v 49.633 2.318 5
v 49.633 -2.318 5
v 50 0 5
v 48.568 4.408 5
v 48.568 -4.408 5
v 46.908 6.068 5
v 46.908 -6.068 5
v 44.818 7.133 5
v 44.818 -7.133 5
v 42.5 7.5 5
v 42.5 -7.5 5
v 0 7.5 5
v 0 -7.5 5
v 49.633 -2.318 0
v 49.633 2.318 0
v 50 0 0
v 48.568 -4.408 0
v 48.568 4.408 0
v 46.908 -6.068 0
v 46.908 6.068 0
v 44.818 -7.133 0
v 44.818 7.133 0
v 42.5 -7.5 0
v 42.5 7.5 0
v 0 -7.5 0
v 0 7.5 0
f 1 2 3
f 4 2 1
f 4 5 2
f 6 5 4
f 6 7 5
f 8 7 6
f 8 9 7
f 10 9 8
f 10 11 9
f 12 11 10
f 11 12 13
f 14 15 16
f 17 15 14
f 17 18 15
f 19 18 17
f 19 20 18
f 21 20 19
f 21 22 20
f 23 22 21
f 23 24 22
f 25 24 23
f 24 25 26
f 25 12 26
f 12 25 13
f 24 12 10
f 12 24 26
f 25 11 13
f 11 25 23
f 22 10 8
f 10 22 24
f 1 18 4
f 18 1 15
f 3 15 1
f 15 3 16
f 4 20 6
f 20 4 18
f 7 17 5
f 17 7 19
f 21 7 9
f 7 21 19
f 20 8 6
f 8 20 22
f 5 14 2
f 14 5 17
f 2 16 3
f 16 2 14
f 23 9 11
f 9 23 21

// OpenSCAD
// file: Library/center.scad
module center(axis){
	translate((axis / -2.0)){
		children();
	}
}
// file: CylinderDispenser_Dispenser_Hearth_Outer_Lip.scad
radius = 24.0;
height = 5.0;

/* [OpenSCAD] [Quality] */
$fn = 20;

module CylinderDispenser_Dispenser_Hearth_Outer_Lip(diameter, height){
		cylinder(d=diameter, h=height);
}

CylinderDispenser_Dispenser_Hearth_Outer_Lip(radius, height);
// file: CylinderDispenser_Dispenser_Hearth_Outer_Walkway.scad
use <Library/center.scad>

//Length, width, height.
dimensions = [50, 24, 5];

module CylinderDispenser_Dispenser_Hearth_Outer_Walkway(dimensions){
	center([0, dimensions[1], 0]){
		cube(dimensions);
	}
}

CylinderDispenser_Dispenser_Hearth_Outer_Walkway(dimensions);
// main file
use <CylinderDispenser_Dispenser_Hearth_Outer_Walkway.scad>
use <CylinderDispenser_Dispenser_Hearth_Outer_Lip.scad>

//Length, width, height. The length is from the start of the the walkway to the end of the lip. The width can be though of as the diameter of the lip.
dimensions = [50, 15, 5];

/* [OpenSCAD] [Quality] */
$fn = 20;

module CylinderDispenser_Dispenser_Hearth_Outer(dimensions){
	diameter = dimensions.y;
	radius = diameter / 2.0;
	walkwayLength = dimensions.x - radius;
	union(){
		CylinderDispenser_Dispenser_Hearth_Outer_Walkway([walkwayLength, dimensions.y, dimensions.z]);
		translate([walkwayLength, 0, 0]){
			CylinderDispenser_Dispenser_Hearth_Outer_Lip(diameter, dimensions.z);
		}
	}
}

CylinderDispenser_Dispenser_Hearth_Outer(dimensions);
